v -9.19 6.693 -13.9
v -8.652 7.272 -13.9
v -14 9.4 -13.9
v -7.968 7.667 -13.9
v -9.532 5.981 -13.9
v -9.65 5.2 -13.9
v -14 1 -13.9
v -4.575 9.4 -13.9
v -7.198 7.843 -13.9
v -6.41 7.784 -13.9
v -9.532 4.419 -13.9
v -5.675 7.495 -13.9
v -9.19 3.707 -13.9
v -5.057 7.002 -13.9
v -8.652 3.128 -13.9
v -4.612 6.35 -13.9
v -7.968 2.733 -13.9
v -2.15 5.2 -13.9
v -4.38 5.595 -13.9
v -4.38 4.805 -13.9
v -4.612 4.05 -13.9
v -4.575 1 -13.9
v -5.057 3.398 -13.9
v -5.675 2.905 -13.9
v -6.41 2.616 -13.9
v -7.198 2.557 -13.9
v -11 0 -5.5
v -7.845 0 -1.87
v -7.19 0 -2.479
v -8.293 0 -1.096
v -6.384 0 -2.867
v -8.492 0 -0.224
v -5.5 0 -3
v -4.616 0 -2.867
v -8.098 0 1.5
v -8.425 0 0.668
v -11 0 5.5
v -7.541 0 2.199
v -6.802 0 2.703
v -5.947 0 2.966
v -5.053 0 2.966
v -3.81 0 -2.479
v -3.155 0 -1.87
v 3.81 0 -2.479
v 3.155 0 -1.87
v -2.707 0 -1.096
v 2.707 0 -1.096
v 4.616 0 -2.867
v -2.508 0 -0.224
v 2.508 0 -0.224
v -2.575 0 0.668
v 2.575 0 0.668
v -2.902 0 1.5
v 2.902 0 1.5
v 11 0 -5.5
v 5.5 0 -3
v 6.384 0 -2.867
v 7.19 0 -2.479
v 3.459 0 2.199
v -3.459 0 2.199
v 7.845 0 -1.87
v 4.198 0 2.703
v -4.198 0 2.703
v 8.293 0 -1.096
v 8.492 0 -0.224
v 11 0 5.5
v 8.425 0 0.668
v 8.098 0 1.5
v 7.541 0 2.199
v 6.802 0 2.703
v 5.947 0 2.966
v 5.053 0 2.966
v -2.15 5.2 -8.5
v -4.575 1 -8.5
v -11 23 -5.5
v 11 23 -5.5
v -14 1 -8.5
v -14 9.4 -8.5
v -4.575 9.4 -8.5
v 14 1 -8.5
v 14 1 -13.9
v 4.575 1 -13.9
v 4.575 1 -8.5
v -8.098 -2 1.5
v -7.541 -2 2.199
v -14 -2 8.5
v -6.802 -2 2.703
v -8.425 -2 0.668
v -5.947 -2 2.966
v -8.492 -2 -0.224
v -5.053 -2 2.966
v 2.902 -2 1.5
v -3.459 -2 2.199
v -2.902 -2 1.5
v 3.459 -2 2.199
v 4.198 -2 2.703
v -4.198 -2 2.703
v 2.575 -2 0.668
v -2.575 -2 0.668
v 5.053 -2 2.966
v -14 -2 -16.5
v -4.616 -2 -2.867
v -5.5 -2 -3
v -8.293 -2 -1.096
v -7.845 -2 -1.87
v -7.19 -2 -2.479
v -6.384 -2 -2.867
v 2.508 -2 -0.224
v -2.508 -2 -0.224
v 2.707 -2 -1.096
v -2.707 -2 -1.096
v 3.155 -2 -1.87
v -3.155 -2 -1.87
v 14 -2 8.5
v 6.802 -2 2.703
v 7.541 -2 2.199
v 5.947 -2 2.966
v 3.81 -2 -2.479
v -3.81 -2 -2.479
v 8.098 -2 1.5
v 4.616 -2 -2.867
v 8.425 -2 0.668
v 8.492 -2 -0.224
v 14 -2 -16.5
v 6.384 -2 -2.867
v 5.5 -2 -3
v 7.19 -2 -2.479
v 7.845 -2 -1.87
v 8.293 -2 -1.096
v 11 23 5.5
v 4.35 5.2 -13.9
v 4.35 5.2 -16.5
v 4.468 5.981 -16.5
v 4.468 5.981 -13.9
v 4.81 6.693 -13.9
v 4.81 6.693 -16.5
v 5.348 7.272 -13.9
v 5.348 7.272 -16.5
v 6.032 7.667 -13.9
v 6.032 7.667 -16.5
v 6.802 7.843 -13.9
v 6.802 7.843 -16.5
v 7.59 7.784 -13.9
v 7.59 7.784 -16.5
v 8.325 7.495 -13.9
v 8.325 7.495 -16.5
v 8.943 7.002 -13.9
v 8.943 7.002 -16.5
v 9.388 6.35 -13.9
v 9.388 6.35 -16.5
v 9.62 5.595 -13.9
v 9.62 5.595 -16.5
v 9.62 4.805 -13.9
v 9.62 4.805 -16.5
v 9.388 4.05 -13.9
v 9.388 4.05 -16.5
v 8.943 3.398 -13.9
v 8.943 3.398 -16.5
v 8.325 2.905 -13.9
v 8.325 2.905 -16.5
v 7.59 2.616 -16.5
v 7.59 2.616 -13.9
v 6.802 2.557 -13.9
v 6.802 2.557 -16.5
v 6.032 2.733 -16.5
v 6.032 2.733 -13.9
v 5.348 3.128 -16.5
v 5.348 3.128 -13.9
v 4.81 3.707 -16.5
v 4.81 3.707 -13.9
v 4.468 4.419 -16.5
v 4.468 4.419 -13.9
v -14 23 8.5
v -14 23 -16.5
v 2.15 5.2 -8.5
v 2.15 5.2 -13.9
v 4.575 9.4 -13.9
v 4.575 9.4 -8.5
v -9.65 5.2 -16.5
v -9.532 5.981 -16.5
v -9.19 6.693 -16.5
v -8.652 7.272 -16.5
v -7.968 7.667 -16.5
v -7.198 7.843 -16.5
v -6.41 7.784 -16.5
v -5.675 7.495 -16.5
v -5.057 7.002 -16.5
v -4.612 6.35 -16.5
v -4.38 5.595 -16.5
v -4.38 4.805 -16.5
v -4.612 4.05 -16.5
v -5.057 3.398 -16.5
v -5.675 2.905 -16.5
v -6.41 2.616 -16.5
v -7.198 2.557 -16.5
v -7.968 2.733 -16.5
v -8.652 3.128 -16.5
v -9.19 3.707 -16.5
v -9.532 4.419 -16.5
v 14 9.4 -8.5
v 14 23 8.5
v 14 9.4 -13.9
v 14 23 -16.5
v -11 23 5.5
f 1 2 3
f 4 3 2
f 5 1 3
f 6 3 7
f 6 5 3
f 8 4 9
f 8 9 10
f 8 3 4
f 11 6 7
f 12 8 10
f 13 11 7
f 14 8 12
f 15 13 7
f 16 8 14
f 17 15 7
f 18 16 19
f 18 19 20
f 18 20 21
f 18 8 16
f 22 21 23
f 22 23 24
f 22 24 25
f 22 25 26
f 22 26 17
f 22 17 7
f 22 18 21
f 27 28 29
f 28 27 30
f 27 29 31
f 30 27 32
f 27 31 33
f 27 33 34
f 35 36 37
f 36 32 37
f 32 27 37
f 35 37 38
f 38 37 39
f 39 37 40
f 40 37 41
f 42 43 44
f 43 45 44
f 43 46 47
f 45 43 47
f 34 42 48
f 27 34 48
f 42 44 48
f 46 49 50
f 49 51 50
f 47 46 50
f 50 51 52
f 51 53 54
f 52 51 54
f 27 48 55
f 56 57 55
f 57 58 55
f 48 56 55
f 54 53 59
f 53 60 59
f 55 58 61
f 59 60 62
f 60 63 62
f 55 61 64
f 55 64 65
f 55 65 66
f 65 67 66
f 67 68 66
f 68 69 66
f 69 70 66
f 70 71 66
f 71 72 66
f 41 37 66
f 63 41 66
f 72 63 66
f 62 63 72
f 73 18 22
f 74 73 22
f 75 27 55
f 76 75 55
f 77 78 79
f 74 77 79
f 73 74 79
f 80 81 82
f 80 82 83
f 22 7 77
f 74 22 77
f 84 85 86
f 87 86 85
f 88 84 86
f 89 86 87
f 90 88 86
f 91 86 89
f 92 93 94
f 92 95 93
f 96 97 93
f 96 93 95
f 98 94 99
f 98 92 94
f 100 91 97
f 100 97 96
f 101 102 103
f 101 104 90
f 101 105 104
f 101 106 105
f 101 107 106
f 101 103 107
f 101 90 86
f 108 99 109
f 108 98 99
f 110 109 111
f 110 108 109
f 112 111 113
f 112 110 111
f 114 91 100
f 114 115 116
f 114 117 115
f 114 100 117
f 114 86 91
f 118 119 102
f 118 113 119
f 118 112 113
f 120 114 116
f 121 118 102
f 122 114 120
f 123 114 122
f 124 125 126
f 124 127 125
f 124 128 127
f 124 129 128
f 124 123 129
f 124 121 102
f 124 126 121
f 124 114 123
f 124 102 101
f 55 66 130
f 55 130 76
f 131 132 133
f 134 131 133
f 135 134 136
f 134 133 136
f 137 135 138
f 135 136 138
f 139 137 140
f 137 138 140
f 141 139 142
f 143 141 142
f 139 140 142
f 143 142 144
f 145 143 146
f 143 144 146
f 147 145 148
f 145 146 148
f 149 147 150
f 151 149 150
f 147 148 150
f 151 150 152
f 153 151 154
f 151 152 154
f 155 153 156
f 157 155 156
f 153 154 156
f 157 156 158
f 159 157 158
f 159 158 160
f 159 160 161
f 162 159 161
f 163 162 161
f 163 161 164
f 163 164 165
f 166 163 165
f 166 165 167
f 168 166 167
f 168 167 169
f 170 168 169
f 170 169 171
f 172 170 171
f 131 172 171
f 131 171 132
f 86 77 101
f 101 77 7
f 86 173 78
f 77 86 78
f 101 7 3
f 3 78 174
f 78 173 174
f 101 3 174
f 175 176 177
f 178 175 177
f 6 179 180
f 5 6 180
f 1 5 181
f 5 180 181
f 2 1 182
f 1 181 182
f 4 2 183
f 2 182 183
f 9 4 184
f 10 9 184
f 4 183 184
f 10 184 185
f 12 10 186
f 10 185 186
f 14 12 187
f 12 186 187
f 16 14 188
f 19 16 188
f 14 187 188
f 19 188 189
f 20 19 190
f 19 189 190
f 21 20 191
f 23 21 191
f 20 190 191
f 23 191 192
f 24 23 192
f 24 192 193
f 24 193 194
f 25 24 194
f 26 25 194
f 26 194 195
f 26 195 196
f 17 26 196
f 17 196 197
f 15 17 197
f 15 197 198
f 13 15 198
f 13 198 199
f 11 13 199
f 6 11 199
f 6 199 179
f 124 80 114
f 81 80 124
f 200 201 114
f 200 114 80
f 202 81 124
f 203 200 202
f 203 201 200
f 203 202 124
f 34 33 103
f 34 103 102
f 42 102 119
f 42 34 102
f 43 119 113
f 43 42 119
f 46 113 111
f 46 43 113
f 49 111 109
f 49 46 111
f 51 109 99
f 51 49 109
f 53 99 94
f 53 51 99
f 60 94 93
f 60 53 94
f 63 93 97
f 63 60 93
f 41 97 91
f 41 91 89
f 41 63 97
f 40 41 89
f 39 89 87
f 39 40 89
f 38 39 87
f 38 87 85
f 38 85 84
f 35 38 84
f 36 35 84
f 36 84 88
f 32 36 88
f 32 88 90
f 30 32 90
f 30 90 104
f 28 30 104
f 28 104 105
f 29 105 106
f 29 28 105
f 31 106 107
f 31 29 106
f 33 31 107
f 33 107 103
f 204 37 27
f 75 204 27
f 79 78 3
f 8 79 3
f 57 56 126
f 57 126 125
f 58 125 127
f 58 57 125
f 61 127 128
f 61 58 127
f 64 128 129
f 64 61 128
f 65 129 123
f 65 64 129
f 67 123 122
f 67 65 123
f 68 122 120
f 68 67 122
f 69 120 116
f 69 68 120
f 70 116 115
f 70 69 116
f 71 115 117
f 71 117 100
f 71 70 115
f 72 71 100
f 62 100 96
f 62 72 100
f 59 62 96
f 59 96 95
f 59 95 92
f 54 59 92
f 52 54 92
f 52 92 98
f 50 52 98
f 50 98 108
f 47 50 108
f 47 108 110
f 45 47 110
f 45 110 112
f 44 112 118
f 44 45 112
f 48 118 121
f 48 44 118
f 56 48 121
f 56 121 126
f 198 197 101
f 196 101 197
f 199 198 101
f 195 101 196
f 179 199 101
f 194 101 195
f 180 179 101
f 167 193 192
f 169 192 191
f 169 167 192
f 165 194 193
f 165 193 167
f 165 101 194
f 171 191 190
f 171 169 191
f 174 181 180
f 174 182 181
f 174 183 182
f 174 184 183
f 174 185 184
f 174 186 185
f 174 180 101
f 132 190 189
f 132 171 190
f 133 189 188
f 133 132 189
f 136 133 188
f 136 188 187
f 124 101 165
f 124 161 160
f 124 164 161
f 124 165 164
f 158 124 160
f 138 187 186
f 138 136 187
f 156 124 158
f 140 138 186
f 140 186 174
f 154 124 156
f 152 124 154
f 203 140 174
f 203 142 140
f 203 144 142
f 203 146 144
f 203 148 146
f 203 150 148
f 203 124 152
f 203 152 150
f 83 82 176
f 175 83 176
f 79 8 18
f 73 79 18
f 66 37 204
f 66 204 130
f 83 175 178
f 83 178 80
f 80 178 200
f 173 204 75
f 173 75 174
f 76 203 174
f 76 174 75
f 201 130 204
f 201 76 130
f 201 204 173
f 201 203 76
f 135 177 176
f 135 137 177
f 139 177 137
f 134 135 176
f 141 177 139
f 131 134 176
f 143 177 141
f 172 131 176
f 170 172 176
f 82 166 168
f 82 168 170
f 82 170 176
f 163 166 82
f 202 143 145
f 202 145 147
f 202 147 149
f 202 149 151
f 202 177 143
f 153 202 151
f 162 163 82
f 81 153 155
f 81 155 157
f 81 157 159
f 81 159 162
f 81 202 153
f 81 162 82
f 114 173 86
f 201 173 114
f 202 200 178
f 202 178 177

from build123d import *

# Parameters (mm, degrees)
SKETCH1_W                = 22
SKETCH1_H                = 11
BOSS_EXTRUDE1_DEPTH      = 23
SKETCH2_W                = 28
SKETCH2_H                = 17
SKETCH2_R                = 3
BOSS_EXTRUDE2_DEPTH      = 2
BOSS_EXTRUDE7_DEPTH      = 28
BOSS_EXTRUDE8_REACH      = 37.025
M5_CLEARANCE_HOLE2_D     = 5.3
M5_CLEARANCE_HOLE2_DEPTH = 2.6


with BuildPart() as part:
    # Sketch1 → Boss-Extrude1 (new body)
    with BuildSketch(Plane(origin=(0, 0, 0), x_dir=(1, 0, 0), z_dir=(0, 1, 0))):
        Polygon((-14, 8.5), (0, 8.5), (14, 8.5), (14, -8.5), (0, -8.5), (-14, -8.5), align=None)
        Rectangle(SKETCH1_W, SKETCH1_H, mode=Mode.SUBTRACT)
    extrude(amount=BOSS_EXTRUDE1_DEPTH)

    # Sketch2 → Boss-Extrude2 (add)
    with BuildSketch(Plane.XZ):
        Rectangle(SKETCH2_W, SKETCH2_H)
        with Locations(Location((-5.5, 0, 0), (0, 0, 270))):
            Circle(SKETCH2_R, mode=Mode.SUBTRACT)
        with Locations(Location((5.5, 0, 0), (0, 0, 270))):
            Circle(SKETCH2_R, mode=Mode.SUBTRACT)
    extrude(amount=BOSS_EXTRUDE2_DEPTH)

    # Sketch10 → Boss-Extrude7 (add, through all)
    with BuildSketch(Plane(origin=(14, 0, 0), x_dir=(0, 0, -1), z_dir=(1, 0, 0))):
        Polygon((16.5, 23), (8.5, 23), (8.5, 9.4), (13.9, 9.4), (13.9, 1), (8.5, 1), (8.5, -2), (16.5, -2), align=None)
    extrude(amount=-BOSS_EXTRUDE7_DEPTH)

    # Sketch11 → Boss-Extrude8 (add, up to next)
    with BuildSketch(Plane.XY.offset(-13.9), mode=Mode.PRIVATE) as boss_extrude8_sk1:
        Polygon((4.575128869, 1), (2.150257739, 5.2), (4.575128869, 9.4), (-4.575128869, 9.4), (-2.150257739, 5.2), (-4.575128869, 1), align=None)
    boss_extrude8_tool1 = extrude(boss_extrude8_sk1.sketch, amount=BOSS_EXTRUDE8_REACH, mode=Mode.PRIVATE) - part.part
    add(boss_extrude8_tool1.solids().sort_by_distance((0, 5.2, -13.9))[0])

    # M5 Clearance Hole2
    with Locations(Plane.XY.offset(-13.9)):
        with Locations((-7, 5.2), (7, 5.2)):
            Hole(M5_CLEARANCE_HOLE2_D / 2, depth=M5_CLEARANCE_HOLE2_DEPTH)


solid = part.part
